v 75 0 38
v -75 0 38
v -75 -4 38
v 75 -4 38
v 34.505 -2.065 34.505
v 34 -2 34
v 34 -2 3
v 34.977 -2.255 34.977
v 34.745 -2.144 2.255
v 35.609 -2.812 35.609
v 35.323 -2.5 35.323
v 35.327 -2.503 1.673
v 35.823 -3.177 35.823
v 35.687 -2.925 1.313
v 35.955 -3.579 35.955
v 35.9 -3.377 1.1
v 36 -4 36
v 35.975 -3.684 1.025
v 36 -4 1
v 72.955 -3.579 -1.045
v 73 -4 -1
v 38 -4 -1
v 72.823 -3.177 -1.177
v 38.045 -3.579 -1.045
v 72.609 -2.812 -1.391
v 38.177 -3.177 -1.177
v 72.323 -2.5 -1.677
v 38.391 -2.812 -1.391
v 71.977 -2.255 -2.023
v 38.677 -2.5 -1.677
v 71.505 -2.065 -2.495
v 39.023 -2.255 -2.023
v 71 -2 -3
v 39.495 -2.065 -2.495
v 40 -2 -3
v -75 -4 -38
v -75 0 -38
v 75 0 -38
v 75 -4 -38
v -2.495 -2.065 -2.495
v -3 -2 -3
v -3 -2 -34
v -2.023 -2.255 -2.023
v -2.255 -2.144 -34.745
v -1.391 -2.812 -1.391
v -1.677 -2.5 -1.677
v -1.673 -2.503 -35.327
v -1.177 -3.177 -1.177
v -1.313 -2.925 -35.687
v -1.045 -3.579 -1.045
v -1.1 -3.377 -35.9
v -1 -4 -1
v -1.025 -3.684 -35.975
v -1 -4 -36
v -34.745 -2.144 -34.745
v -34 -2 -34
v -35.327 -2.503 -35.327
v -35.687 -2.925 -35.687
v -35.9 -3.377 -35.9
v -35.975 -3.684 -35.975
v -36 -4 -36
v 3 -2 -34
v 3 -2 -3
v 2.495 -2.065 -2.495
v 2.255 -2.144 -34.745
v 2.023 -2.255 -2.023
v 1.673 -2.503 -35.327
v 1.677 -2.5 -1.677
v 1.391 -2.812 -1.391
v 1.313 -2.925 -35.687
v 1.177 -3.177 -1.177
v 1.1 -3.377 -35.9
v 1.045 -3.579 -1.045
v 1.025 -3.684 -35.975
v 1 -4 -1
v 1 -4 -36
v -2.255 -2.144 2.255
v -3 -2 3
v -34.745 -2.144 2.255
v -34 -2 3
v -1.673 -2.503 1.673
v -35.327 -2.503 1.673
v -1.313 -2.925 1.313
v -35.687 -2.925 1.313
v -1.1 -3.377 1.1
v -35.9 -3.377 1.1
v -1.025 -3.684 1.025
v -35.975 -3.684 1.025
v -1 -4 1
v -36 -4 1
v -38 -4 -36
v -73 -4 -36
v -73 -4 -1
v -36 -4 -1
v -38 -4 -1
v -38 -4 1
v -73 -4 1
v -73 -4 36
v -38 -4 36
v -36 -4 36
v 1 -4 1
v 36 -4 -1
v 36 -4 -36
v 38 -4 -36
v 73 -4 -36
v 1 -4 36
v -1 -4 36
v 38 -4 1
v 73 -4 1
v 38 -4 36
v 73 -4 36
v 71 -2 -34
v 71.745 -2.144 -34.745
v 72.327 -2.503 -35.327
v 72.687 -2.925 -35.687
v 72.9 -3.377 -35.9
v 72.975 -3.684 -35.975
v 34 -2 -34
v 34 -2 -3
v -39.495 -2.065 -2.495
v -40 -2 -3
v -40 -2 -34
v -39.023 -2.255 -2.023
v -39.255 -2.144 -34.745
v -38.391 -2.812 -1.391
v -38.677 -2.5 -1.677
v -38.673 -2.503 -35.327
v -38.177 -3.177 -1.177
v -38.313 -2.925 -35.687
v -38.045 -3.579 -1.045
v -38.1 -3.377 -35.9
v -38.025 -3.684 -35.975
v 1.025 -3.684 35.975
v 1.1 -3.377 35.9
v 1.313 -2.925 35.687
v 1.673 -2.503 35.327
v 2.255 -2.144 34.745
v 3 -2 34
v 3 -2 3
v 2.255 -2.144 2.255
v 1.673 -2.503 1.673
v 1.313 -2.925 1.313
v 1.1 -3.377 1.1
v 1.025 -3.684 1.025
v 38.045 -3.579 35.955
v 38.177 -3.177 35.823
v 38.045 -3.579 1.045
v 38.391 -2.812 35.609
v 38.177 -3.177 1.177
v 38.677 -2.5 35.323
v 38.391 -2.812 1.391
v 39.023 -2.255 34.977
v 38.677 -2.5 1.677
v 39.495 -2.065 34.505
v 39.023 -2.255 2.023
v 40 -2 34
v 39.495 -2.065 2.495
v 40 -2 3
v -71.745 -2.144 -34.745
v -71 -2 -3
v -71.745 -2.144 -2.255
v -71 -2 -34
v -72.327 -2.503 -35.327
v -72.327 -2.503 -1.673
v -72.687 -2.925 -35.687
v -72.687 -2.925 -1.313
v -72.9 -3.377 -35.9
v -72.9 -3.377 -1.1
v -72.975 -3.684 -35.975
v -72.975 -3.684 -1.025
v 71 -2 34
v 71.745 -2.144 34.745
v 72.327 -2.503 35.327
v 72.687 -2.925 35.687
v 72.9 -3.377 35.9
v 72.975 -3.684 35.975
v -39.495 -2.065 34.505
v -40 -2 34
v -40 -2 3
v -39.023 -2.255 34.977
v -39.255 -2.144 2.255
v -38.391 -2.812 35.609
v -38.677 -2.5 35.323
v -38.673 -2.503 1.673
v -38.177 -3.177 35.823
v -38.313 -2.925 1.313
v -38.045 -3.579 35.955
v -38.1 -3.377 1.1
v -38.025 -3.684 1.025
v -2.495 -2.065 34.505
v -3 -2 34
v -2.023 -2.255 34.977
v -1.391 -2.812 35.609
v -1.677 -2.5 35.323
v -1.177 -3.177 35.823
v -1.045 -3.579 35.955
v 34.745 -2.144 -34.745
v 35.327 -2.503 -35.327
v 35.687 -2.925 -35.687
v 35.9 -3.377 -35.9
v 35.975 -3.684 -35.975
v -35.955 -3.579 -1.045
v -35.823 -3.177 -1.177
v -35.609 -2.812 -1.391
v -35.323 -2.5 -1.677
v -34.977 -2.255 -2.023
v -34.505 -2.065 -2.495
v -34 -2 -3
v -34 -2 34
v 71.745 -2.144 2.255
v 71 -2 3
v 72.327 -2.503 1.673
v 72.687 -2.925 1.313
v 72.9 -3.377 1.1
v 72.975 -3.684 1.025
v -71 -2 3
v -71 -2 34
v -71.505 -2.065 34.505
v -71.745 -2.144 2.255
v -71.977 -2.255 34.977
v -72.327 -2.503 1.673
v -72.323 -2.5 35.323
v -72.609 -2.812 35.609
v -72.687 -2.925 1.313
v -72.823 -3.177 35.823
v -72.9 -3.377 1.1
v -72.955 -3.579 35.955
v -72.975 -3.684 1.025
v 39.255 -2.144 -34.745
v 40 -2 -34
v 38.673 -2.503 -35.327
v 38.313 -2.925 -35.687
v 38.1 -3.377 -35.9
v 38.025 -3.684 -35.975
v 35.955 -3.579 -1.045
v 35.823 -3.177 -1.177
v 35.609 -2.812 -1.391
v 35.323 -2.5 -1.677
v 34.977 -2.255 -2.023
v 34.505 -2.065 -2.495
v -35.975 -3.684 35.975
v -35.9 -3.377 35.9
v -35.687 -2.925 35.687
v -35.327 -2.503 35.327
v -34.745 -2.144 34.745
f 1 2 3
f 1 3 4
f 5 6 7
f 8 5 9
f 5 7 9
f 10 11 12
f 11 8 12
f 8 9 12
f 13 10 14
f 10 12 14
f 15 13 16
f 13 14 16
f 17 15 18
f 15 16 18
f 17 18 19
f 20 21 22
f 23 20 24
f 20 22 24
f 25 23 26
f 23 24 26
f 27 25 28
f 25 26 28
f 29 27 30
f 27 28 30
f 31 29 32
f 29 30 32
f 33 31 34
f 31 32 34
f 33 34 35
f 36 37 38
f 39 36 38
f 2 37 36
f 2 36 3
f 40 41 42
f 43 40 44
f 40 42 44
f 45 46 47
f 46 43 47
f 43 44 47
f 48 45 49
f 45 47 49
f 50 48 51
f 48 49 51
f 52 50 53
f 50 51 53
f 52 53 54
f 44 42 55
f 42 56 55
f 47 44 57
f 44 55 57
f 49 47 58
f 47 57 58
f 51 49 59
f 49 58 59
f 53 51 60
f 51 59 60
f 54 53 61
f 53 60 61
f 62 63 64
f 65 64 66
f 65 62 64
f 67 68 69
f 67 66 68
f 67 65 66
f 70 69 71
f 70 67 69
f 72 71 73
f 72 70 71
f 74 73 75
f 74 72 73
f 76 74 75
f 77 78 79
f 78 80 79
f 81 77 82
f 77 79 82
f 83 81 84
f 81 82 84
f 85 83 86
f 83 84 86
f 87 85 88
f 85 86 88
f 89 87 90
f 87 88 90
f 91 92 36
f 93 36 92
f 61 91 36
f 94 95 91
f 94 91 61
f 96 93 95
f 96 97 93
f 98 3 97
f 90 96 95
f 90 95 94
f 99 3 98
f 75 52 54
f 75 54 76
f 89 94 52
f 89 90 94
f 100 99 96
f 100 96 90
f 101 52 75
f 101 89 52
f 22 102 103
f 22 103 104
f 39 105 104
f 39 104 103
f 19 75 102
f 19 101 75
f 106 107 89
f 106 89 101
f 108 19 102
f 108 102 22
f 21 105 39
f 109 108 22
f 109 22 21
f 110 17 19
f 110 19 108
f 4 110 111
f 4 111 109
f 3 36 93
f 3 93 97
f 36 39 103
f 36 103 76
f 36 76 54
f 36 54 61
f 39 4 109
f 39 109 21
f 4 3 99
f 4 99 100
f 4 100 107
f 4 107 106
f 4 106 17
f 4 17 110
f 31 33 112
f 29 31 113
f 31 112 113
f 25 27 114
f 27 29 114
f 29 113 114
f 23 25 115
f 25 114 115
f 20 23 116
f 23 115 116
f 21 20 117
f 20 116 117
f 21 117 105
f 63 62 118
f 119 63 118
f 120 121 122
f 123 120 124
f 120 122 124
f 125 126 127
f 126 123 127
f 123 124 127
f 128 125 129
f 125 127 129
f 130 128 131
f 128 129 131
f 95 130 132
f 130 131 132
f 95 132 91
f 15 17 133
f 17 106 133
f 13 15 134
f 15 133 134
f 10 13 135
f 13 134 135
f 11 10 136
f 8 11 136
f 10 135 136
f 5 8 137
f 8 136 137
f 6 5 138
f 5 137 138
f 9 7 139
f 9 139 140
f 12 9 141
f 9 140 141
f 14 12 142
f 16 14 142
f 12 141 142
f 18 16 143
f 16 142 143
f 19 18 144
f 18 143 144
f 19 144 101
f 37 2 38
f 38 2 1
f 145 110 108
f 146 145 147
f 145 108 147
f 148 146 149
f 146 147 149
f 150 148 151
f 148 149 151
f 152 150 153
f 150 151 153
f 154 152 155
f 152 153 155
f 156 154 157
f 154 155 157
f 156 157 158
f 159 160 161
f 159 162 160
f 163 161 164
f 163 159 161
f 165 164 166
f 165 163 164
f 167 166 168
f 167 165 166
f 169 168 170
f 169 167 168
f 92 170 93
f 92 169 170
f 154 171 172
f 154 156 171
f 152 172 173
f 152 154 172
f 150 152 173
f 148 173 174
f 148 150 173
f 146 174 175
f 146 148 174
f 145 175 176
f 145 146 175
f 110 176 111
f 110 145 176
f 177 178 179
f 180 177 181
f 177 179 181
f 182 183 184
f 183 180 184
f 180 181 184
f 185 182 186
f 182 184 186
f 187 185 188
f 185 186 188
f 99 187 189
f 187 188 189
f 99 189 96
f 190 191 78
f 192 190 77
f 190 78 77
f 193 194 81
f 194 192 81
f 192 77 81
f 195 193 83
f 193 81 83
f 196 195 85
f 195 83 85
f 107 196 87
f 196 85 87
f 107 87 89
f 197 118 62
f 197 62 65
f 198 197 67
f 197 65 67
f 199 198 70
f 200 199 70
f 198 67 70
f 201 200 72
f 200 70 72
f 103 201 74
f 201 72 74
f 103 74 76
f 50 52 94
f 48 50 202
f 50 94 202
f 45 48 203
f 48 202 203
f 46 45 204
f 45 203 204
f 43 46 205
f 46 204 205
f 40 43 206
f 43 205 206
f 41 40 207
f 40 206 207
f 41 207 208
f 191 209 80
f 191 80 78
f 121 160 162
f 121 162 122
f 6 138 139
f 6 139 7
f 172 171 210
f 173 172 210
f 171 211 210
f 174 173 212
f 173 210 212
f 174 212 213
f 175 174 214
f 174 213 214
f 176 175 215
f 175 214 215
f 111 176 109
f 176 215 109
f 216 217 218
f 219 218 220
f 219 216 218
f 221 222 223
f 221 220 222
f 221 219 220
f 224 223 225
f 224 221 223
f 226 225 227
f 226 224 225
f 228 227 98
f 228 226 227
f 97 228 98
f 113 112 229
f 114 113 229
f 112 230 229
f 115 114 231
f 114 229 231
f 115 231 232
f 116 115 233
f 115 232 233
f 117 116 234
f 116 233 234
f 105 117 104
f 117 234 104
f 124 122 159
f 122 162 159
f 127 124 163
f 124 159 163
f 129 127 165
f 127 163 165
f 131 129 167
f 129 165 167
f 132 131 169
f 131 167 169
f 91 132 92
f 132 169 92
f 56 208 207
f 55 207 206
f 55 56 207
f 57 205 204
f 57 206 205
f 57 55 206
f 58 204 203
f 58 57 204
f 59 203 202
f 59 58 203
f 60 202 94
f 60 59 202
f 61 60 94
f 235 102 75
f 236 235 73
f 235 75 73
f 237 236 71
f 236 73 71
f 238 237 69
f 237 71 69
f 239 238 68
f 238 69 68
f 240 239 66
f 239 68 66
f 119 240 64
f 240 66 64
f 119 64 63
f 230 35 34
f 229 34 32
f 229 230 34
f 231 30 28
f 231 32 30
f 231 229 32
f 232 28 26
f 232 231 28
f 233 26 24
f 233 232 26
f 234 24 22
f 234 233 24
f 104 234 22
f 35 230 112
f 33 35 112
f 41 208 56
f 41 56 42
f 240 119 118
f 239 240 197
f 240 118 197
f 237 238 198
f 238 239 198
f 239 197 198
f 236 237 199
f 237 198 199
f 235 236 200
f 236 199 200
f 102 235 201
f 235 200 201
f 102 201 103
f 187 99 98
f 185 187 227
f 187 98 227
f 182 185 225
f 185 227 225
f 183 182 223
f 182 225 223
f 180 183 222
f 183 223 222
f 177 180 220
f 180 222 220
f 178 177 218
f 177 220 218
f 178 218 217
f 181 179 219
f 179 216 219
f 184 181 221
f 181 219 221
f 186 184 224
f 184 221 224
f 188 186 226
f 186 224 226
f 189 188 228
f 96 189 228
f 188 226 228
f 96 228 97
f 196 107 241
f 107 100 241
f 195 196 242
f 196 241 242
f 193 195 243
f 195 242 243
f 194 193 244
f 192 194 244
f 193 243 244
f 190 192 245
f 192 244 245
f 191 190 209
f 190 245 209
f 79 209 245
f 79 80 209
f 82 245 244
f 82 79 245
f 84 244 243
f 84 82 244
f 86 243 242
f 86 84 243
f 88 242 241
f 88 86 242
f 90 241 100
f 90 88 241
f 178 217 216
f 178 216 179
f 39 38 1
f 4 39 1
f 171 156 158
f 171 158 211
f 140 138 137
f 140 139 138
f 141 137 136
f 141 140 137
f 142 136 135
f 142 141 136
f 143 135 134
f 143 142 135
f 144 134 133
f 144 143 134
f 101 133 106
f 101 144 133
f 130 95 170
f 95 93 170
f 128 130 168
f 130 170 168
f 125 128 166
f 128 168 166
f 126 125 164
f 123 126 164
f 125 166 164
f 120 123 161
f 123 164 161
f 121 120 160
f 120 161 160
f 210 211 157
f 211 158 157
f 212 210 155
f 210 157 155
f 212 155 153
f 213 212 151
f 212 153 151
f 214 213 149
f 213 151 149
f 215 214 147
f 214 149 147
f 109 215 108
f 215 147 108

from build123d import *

# Parameters (mm, degrees)
F0_W     = 150
F0_H     = 76
F0_W_2   = 35
F0_H_2   = 35
F1_DEPTH = 2
F2_DEPTH = 4
F3_R     = 1.99999


# Not quite as in the source:
# - a fillet or chamfer is up to 0.001 mm smaller than in the source, because OpenCascade refuses the exact size


with BuildPart() as f1:
    # F0 (on Front) → F1 (new body)
    with BuildSketch(Plane.XZ):
        Rectangle(F0_W, F0_H)
        with Locations((-55.5, -18.5)):
            Rectangle(F0_W_2, F0_H_2, mode=Mode.SUBTRACT)
        with Locations((-18.5, -18.5)):
            Rectangle(F0_W_2, F0_H_2, mode=Mode.SUBTRACT)
        with Locations((18.5, -18.5)):
            Rectangle(F0_W_2, F0_H_2, mode=Mode.SUBTRACT)
        with Locations((55.5, -18.5)):
            Rectangle(F0_W_2, F0_H_2, mode=Mode.SUBTRACT)
        with Locations((-55.5, 18.5)):
            Rectangle(F0_W_2, F0_H_2, mode=Mode.SUBTRACT)
        with Locations((-18.5, 18.5)):
            Rectangle(F0_W_2, F0_H_2, mode=Mode.SUBTRACT)
        with Locations((18.5, 18.5)):
            Rectangle(F0_W_2, F0_H_2, mode=Mode.SUBTRACT)
        with Locations((55.5, 18.5)):
            Rectangle(F0_W_2, F0_H_2, mode=Mode.SUBTRACT)
        with Locations((-55.5, -18.5)):
            Rectangle(F0_W_2, F0_H_2)
        with Locations((-55.5, 18.5)):
            Rectangle(F0_W_2, F0_H_2)
        with Locations((-18.5, 18.5)):
            Rectangle(F0_W_2, F0_H_2)
        with Locations((18.5, 18.5)):
            Rectangle(F0_W_2, F0_H_2)
        with Locations((55.5, -18.5)):
            Rectangle(F0_W_2, F0_H_2)
        with Locations((55.5, 18.5)):
            Rectangle(F0_W_2, F0_H_2)
        with Locations((18.5, -18.5)):
            Rectangle(F0_W_2, F0_H_2)
        with Locations((-18.5, -18.5)):
            Rectangle(F0_W_2, F0_H_2)
    extrude(amount=F1_DEPTH)

    # F0 (on Front) → F2 (join)
    with BuildSketch(Plane.XZ):
        Rectangle(F0_W, F0_H)
        with Locations((-55.5, -18.5)):
            Rectangle(F0_W_2, F0_H_2, mode=Mode.SUBTRACT)
        with Locations((-18.5, -18.5)):
            Rectangle(F0_W_2, F0_H_2, mode=Mode.SUBTRACT)
        with Locations((18.5, -18.5)):
            Rectangle(F0_W_2, F0_H_2, mode=Mode.SUBTRACT)
        with Locations((55.5, -18.5)):
            Rectangle(F0_W_2, F0_H_2, mode=Mode.SUBTRACT)
        with Locations((-55.5, 18.5)):
            Rectangle(F0_W_2, F0_H_2, mode=Mode.SUBTRACT)
        with Locations((-18.5, 18.5)):
            Rectangle(F0_W_2, F0_H_2, mode=Mode.SUBTRACT)
        with Locations((18.5, 18.5)):
            Rectangle(F0_W_2, F0_H_2, mode=Mode.SUBTRACT)
        with Locations((55.5, 18.5)):
            Rectangle(F0_W_2, F0_H_2, mode=Mode.SUBTRACT)
    extrude(amount=F2_DEPTH)

    # F3 (radius 2 in the source; OpenCascade refuses exactly that, so slightly less here)
    f3_edges = [f1.edges().sort_by_distance(p)[0] for p in [
        (-73, -2, -18.5),
        (-55.5, -2, -1),
        (-55.5, -2, 36),
        (-36, -2, 18.5),
        (-18.5, -2, 36),
        (-73, -2, 18.5),
        (1, -2, 18.5),
        (18.5, -2, 36),
        (38, -2, 18.5),
        (55.5, -2, 36),
        (55.5, -2, -1),
        (38, -2, -18.5),
        (18.5, -2, -1),
        (1, -2, -18.5),
        (-18.5, -2, -1),
        (-36, -2, -18.5),
        (73, -2, -18.5),
        (55.5, -2, -36),
        (18.5, -2, -36),
        (-18.5, -2, -36),
        (-55.5, -2, -36),
        (-38, -2, -18.5),
        (-1, -2, -18.5),
        (36, -2, -18.5),
        (55.5, -2, 1),
        (73, -2, 18.5),
        (18.5, -2, 1),
        (36, -2, 18.5),
        (-18.5, -2, 1),
        (-1, -2, 18.5),
        (-55.5, -2, 1),
        (-38, -2, 18.5),
    ]]
    fillet(f3_edges, radius=F3_R)


solid = f1.part
